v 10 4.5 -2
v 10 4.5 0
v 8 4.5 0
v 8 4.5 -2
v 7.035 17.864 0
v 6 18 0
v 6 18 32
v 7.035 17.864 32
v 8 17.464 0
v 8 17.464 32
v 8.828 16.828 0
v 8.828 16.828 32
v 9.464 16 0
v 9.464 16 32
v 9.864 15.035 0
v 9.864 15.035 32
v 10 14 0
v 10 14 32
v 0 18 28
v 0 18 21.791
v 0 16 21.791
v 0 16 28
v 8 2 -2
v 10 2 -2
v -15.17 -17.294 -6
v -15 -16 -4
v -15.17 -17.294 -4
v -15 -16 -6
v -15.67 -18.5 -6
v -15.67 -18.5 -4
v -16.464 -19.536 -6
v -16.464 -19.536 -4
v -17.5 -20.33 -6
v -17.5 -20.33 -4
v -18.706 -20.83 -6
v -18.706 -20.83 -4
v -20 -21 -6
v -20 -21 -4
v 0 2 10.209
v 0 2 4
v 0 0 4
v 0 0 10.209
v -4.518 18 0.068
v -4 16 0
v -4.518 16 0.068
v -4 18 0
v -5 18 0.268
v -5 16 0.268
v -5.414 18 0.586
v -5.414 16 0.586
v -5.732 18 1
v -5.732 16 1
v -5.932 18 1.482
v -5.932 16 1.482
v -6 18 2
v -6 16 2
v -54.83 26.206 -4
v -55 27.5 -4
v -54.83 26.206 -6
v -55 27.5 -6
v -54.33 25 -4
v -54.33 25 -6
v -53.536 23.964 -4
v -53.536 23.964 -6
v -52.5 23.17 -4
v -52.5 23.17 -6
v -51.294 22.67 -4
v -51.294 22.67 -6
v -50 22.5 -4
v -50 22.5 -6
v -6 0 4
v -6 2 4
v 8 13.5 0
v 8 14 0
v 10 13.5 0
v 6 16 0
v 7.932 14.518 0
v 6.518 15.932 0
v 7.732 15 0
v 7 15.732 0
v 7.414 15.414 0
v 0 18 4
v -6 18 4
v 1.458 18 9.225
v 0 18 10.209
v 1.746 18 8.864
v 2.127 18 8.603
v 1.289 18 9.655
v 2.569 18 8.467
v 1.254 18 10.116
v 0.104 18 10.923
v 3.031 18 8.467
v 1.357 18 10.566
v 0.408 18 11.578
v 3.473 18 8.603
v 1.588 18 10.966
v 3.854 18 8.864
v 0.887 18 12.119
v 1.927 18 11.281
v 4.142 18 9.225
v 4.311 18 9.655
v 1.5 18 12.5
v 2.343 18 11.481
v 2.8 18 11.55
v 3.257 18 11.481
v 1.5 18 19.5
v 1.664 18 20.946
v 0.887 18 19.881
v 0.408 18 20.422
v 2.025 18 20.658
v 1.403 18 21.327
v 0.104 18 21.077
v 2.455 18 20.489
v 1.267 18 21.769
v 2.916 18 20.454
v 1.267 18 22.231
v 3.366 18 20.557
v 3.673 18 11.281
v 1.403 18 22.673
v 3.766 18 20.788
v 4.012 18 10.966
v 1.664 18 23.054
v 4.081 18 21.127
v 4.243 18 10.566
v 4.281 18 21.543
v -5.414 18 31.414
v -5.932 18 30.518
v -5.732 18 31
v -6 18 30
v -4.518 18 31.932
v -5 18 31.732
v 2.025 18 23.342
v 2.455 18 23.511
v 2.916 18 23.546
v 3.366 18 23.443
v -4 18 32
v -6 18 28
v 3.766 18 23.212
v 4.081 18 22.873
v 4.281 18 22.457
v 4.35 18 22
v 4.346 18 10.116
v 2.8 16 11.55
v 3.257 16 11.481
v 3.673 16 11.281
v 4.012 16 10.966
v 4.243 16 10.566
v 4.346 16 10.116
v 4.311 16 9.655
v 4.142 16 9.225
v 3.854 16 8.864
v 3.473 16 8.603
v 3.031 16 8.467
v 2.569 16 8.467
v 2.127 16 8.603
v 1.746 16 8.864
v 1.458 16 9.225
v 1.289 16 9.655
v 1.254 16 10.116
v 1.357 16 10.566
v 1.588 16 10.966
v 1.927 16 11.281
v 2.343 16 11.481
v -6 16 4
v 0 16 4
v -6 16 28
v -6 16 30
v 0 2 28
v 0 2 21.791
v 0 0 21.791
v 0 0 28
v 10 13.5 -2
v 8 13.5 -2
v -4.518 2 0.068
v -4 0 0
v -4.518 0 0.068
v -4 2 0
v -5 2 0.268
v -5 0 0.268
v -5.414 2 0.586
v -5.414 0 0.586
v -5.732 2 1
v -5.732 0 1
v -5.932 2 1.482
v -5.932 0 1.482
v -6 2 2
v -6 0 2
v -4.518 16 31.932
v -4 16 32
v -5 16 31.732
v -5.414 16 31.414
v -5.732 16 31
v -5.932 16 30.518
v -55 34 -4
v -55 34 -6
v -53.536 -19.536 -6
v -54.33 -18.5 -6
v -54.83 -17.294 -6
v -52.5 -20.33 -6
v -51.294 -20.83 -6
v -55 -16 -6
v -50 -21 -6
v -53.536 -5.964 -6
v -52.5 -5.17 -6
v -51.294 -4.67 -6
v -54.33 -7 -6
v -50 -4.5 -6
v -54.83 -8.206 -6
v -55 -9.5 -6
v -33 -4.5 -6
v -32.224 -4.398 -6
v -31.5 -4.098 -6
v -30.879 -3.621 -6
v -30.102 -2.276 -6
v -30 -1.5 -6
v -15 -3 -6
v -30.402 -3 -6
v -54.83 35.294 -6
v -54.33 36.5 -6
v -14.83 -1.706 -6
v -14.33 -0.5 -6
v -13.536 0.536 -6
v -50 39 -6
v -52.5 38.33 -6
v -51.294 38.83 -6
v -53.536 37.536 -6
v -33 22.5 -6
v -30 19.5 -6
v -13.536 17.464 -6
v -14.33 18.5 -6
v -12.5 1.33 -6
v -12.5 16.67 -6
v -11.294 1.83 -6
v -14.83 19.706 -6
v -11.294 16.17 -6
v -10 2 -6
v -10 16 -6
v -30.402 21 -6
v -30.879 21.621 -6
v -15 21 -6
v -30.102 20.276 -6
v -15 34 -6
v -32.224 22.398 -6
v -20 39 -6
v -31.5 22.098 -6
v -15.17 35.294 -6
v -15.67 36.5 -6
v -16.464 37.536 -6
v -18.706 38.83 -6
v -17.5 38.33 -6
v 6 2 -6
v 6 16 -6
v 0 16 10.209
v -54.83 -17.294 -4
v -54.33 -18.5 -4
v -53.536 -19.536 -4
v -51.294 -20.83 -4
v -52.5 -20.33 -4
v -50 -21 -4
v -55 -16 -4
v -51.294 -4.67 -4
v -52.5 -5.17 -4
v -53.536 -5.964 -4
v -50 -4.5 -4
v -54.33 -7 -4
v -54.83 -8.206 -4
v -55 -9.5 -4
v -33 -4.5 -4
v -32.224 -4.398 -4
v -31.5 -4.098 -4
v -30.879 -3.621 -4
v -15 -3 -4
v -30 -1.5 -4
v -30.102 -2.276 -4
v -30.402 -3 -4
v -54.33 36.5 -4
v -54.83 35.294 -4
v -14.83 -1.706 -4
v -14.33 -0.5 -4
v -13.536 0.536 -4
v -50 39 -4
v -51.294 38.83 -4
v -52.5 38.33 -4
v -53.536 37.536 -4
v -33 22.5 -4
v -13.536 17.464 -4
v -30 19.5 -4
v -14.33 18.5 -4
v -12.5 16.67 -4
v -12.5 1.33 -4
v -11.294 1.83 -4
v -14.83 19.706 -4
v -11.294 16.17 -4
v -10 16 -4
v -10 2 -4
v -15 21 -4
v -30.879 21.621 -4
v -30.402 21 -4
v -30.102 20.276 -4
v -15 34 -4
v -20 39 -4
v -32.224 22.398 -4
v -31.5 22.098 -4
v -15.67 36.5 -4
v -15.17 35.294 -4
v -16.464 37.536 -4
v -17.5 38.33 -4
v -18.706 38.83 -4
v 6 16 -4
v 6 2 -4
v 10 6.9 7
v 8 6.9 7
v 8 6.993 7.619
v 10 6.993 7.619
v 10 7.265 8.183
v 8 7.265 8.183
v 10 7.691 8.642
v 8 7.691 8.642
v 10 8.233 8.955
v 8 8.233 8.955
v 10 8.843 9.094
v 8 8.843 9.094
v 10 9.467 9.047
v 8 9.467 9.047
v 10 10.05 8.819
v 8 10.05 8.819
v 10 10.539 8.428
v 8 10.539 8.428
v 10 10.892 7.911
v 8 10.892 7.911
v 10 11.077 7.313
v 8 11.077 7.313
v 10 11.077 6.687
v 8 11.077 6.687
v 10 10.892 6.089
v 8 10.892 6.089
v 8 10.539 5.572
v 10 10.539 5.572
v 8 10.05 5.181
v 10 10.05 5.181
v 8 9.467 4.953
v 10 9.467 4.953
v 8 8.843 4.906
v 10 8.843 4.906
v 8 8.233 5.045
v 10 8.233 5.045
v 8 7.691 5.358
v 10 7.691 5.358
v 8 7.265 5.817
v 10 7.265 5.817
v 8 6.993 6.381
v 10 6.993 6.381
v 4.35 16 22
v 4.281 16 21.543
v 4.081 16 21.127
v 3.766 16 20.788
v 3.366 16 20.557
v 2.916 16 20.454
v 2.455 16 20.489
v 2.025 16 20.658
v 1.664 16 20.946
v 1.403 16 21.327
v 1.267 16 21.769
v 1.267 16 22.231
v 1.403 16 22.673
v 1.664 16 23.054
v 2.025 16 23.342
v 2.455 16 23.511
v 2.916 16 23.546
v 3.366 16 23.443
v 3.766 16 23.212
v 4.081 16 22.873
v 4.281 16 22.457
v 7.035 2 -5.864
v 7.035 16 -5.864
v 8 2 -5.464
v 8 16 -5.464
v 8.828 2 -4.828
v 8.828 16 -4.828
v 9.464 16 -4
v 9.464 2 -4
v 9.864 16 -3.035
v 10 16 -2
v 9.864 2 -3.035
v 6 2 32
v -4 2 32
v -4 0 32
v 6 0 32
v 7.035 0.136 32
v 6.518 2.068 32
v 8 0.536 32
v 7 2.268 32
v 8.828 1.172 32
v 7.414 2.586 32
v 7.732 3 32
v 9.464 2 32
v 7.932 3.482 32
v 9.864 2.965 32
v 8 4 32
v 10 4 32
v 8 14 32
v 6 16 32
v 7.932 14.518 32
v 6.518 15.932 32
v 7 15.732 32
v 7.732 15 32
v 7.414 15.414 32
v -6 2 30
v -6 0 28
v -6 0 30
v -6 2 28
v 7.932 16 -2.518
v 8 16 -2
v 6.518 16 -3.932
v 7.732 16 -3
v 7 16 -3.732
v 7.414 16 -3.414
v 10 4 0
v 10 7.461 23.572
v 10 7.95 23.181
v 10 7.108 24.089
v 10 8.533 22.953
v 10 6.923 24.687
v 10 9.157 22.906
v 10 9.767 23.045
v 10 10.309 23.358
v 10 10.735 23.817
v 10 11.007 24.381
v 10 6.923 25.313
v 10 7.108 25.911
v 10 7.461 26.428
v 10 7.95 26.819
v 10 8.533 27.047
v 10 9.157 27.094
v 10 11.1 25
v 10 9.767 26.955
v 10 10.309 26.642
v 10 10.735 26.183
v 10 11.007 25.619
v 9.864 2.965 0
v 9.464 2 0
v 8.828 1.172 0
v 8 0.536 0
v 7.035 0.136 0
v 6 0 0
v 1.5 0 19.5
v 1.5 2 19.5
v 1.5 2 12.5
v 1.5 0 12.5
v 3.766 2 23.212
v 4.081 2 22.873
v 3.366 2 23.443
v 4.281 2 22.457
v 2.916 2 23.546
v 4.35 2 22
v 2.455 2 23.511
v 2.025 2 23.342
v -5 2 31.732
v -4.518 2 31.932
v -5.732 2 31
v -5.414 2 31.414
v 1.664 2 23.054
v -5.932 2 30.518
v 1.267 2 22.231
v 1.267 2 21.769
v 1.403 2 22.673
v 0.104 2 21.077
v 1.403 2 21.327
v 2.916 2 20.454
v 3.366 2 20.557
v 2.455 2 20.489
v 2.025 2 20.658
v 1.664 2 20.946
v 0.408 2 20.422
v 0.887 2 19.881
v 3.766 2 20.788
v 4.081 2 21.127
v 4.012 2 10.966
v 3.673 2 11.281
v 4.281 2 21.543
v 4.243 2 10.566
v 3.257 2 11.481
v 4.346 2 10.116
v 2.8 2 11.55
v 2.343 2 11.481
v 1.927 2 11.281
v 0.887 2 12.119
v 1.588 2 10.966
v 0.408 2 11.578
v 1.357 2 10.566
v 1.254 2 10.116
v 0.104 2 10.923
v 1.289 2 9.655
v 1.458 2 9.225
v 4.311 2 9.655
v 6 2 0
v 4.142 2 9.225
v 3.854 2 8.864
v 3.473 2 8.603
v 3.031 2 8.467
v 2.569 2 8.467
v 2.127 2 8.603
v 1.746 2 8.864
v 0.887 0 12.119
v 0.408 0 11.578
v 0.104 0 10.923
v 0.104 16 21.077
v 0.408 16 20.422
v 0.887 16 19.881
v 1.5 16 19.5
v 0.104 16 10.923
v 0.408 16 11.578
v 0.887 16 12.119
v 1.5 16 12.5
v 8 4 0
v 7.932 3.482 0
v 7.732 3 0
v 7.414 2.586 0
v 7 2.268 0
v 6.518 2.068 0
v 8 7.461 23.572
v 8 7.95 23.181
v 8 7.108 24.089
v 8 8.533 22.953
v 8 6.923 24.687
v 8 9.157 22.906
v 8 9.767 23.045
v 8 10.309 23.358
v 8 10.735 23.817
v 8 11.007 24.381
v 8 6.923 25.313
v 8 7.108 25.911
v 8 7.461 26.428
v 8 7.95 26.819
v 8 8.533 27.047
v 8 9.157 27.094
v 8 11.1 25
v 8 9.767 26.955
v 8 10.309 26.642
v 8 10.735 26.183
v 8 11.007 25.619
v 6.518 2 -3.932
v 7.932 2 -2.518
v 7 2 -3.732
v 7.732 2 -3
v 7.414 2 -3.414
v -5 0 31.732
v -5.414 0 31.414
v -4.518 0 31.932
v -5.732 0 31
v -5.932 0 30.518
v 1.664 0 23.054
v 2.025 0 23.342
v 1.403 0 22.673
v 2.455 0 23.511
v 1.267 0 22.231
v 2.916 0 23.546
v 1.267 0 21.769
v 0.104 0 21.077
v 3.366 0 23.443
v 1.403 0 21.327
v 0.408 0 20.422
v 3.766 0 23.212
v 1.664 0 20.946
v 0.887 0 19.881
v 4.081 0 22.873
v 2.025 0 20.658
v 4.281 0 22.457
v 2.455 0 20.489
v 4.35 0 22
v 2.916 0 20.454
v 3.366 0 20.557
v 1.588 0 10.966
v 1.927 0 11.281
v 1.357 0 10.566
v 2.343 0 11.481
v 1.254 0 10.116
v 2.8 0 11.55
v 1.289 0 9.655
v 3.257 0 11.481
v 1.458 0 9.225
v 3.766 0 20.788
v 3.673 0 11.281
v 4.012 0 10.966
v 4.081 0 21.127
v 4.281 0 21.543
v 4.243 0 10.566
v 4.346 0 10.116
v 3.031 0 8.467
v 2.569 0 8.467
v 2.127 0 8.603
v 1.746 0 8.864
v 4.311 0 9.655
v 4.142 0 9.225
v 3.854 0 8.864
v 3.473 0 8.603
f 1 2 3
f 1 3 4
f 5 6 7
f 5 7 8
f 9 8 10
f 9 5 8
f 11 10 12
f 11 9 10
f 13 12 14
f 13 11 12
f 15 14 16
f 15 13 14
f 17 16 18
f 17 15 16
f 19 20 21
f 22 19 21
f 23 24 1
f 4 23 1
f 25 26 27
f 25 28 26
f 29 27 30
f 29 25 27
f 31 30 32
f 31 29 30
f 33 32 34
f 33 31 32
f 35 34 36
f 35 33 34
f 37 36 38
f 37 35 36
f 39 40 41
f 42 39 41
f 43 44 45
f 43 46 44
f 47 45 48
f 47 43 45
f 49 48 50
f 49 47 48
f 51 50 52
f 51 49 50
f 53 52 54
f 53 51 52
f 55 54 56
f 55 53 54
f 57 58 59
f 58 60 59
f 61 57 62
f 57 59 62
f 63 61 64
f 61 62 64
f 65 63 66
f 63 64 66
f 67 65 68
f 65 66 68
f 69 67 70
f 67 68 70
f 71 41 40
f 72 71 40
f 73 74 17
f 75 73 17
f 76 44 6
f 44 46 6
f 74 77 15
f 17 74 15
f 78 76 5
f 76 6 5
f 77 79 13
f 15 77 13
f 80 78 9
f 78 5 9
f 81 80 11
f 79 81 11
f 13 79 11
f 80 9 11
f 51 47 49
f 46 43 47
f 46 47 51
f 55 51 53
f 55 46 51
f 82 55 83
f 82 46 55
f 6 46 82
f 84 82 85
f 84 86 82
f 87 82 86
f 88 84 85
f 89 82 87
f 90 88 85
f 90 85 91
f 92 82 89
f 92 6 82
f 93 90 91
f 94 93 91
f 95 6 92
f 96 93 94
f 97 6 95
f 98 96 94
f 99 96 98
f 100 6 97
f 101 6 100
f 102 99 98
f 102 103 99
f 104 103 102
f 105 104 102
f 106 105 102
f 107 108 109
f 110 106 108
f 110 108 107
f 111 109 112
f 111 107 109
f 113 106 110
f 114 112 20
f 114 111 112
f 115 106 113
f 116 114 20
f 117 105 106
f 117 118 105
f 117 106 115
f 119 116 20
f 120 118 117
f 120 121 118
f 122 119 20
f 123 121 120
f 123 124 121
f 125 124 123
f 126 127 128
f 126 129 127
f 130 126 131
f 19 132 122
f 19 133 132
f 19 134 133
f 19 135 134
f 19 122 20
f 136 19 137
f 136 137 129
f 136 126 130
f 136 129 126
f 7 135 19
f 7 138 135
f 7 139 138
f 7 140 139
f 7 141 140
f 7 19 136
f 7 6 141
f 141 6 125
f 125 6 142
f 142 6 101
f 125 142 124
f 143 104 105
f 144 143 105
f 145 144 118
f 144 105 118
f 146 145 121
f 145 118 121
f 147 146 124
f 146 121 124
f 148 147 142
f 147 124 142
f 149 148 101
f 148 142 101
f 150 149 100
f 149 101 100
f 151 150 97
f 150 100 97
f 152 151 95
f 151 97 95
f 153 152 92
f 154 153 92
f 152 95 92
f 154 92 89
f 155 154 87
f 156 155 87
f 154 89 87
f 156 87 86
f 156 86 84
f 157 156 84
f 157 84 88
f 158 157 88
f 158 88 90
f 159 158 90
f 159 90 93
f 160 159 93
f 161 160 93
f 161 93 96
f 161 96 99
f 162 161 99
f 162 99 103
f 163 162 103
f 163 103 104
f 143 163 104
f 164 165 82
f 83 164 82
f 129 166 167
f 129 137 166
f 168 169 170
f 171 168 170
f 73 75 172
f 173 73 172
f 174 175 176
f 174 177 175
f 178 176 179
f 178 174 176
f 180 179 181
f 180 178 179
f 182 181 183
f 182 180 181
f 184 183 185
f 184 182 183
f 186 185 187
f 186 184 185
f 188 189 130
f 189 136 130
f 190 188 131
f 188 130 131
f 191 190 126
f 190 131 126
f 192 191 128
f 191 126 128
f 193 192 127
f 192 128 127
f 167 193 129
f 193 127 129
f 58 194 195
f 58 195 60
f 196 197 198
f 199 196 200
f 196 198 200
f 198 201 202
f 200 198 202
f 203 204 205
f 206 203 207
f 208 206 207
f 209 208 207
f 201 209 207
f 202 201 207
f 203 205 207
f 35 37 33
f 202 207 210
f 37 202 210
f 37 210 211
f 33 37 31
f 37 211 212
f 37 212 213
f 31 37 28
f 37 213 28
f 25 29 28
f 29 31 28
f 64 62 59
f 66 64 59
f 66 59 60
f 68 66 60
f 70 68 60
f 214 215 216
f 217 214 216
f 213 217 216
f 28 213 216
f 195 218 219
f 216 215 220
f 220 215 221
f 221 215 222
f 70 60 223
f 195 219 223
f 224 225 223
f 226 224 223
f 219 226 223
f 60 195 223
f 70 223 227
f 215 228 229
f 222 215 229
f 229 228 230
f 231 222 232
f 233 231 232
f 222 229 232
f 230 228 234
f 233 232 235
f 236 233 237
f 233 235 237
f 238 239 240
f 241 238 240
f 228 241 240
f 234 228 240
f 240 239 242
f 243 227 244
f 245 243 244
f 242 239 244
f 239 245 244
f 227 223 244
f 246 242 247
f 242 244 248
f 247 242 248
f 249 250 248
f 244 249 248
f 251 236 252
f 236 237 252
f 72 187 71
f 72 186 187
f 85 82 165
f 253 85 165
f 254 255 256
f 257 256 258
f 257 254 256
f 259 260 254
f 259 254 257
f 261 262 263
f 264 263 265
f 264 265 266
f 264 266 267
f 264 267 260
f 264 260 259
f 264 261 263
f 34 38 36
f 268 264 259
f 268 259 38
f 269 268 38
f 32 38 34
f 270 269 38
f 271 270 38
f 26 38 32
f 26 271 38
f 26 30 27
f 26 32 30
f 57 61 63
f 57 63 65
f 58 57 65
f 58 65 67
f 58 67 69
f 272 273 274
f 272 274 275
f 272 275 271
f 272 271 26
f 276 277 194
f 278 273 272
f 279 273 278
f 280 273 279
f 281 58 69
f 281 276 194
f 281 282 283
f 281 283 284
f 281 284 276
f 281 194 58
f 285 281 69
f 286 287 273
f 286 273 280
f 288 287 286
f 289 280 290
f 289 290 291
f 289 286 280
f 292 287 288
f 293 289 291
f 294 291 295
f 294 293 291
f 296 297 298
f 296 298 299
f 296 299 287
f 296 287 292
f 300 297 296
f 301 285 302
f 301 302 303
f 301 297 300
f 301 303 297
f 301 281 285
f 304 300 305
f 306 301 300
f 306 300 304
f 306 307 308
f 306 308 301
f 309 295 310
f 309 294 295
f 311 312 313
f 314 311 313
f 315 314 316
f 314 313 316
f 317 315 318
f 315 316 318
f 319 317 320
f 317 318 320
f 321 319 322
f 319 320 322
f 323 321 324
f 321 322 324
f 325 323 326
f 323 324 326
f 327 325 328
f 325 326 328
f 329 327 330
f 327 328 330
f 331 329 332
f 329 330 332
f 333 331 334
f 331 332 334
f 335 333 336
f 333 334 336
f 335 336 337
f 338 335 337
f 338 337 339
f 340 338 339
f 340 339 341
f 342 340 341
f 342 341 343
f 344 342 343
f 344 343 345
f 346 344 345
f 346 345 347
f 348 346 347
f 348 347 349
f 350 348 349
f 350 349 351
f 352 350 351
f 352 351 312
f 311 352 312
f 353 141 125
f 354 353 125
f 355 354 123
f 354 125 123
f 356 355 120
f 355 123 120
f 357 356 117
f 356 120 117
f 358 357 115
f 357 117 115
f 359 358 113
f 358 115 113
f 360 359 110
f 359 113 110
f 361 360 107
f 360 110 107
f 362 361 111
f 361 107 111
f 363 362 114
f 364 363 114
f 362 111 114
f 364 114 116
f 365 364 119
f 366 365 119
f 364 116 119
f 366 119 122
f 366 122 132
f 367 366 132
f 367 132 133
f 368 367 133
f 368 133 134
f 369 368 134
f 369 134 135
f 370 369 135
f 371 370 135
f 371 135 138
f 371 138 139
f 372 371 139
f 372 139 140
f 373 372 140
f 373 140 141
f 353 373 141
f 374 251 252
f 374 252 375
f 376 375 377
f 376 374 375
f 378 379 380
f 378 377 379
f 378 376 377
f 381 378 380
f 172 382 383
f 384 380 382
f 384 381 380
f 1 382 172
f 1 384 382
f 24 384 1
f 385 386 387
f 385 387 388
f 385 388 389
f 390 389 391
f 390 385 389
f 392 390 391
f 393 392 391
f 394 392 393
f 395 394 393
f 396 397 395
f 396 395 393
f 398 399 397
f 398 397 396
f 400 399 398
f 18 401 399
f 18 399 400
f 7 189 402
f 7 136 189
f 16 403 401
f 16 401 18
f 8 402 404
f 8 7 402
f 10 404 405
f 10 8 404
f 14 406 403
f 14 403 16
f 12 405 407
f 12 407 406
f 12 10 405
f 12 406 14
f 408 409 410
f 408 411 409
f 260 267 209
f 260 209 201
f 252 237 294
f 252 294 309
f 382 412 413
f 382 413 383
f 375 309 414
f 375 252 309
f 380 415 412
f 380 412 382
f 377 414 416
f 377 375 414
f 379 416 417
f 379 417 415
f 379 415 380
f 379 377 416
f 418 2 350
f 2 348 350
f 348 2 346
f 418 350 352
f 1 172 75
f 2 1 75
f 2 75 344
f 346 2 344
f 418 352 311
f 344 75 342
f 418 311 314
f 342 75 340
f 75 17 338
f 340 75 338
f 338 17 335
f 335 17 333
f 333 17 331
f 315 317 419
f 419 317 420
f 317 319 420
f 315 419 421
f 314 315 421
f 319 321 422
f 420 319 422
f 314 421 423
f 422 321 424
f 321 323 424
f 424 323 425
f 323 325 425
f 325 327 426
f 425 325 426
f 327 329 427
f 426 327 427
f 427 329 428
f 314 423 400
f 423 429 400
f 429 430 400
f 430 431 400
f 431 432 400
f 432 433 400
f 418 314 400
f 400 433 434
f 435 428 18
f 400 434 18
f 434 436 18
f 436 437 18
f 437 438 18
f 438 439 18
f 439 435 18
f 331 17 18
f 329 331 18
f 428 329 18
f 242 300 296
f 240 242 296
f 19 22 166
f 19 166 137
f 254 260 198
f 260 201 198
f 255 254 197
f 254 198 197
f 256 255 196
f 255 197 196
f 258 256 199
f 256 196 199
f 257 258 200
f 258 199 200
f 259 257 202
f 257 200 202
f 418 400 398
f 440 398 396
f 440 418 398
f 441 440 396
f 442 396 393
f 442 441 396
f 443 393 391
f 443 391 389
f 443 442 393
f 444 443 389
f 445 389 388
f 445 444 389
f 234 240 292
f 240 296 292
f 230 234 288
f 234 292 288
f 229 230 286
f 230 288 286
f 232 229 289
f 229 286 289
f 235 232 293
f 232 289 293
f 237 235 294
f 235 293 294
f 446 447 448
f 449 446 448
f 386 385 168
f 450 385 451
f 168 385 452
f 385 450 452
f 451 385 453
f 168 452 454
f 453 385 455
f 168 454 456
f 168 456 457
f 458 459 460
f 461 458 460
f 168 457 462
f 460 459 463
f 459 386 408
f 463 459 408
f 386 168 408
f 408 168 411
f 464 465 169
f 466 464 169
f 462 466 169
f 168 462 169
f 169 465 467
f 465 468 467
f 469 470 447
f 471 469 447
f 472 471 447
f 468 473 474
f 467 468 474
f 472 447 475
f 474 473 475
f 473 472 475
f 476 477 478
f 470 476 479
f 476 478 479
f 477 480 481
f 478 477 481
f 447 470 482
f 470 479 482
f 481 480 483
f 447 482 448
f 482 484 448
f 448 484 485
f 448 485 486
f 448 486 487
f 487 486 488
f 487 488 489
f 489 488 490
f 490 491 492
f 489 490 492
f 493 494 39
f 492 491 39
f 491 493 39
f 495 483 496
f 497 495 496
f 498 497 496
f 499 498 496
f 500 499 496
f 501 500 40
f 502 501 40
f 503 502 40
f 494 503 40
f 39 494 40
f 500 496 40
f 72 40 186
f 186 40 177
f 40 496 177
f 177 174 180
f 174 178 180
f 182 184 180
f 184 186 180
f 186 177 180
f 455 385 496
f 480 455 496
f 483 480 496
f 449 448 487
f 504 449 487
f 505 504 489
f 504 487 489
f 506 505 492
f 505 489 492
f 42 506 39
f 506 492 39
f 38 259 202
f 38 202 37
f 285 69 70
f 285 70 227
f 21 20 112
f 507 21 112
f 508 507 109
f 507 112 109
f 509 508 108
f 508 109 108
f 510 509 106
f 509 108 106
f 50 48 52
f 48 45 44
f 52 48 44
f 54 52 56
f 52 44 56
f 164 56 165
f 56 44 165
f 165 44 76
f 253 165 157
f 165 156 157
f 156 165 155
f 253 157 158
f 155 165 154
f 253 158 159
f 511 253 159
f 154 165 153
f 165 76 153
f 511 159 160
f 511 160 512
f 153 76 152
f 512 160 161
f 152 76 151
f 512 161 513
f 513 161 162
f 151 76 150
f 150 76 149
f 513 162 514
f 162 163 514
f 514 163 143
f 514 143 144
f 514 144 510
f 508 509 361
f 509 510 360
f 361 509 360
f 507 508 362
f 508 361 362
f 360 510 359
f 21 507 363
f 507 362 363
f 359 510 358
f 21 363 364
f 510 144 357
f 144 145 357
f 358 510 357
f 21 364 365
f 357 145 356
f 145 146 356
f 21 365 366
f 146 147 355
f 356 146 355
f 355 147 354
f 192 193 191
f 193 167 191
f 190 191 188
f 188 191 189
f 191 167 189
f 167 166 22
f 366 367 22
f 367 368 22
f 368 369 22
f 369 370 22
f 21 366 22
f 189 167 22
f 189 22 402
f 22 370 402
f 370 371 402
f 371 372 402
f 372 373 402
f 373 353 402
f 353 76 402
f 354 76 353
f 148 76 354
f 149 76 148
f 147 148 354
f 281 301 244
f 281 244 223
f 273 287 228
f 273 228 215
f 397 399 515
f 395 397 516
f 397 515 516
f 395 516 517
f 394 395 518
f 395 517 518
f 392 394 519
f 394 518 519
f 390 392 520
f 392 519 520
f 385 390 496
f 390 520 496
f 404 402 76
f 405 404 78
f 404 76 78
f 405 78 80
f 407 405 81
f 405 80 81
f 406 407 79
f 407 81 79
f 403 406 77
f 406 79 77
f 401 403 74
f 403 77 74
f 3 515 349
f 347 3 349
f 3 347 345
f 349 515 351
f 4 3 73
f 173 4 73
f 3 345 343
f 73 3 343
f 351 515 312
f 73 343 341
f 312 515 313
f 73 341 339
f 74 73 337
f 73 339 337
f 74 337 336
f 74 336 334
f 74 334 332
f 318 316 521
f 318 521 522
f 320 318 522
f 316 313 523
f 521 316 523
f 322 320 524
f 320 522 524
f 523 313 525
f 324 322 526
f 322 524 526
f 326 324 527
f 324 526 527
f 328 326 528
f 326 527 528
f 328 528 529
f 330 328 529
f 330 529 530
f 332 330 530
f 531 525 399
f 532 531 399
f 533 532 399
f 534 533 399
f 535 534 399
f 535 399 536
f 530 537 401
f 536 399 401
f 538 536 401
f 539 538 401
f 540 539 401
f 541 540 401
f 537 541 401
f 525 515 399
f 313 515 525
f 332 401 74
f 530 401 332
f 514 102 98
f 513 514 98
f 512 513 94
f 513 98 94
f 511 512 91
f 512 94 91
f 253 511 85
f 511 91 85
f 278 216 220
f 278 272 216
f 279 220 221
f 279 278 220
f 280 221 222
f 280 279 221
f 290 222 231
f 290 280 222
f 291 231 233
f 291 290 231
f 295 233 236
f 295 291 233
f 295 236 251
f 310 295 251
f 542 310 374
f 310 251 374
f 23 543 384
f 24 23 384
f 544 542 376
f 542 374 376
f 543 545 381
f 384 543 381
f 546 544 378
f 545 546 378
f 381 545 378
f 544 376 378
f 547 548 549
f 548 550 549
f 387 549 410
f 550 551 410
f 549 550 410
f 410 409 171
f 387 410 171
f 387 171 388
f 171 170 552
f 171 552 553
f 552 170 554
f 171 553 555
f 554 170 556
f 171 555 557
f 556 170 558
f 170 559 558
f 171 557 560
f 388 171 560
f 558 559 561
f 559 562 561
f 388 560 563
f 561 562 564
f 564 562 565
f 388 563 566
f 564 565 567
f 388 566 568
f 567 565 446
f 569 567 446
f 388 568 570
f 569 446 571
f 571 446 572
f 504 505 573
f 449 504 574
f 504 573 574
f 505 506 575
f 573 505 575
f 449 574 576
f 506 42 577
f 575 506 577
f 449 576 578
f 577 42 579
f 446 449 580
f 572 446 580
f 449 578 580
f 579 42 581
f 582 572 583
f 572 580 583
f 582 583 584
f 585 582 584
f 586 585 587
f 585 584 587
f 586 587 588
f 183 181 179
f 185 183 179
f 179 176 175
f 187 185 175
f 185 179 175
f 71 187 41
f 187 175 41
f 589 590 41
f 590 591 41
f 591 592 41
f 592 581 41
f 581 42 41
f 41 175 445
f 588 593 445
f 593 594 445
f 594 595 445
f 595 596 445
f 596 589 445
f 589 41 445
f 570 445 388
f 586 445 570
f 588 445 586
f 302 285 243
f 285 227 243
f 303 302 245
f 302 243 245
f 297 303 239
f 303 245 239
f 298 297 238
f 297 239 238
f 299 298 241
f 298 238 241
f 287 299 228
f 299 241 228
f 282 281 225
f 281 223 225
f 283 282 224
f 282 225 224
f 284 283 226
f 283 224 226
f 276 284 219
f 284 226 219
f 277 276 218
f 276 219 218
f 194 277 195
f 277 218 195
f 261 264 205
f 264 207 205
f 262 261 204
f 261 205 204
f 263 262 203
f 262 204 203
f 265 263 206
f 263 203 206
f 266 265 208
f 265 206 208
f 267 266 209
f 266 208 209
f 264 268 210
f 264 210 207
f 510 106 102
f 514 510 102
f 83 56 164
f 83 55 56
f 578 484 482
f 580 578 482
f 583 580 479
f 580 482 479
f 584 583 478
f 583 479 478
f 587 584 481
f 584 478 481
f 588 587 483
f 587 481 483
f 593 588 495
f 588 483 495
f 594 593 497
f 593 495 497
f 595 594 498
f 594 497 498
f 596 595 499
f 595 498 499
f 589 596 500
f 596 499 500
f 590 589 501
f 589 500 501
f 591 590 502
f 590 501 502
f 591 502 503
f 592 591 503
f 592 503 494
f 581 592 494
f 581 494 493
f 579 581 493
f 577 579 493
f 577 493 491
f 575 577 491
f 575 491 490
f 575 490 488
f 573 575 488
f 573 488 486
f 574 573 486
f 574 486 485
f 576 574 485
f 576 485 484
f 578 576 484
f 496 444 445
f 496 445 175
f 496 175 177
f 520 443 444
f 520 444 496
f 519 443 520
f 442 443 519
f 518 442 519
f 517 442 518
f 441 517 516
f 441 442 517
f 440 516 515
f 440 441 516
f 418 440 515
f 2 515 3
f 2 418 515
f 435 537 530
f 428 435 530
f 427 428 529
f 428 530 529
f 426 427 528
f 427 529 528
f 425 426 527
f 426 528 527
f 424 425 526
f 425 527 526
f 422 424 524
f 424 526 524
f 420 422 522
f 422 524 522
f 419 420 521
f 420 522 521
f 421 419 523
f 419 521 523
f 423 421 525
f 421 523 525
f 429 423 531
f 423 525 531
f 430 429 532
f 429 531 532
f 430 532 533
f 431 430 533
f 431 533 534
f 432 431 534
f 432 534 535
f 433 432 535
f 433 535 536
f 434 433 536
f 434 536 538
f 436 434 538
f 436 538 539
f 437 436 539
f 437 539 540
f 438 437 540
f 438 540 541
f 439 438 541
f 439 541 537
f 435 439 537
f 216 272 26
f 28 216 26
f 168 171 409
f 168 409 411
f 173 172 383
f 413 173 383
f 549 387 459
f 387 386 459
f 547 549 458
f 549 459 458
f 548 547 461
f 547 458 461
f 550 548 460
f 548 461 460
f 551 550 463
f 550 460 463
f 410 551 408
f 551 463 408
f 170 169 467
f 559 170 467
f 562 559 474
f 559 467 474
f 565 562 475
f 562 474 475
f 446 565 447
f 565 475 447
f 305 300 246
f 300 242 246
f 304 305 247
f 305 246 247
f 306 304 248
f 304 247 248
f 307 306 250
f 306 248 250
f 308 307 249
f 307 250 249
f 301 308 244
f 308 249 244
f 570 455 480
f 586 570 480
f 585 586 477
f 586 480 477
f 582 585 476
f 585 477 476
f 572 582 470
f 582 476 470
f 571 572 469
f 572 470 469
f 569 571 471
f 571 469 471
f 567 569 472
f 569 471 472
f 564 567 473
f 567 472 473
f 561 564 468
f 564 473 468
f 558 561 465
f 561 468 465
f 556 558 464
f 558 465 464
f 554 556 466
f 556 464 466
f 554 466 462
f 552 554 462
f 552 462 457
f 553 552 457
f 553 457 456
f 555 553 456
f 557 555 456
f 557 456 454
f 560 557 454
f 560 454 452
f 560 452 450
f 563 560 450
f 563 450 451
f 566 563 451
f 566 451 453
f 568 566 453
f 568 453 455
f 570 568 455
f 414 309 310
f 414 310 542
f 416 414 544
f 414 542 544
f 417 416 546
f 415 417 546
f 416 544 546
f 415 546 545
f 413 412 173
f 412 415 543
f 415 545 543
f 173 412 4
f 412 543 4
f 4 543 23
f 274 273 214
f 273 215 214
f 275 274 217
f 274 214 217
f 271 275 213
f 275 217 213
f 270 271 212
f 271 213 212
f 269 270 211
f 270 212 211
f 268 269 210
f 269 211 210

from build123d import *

# Parameters (mm, degrees)
BOSS_EXTRU_1_DEPTH        = 32
ESQUISSE2_R               = 1.55
ENL_V_MAT_EXTRU_1_DEPTH   = 39.052595181
ESQUISSE3_W               = 1.5
ESQUISSE3_H               = 7
ENL_V_MAT_EXTRU_2_DEPTH   = 39.052595181
ESQUISSE4_W               = 4
ESQUISSE4_H               = 2
BOSS_EXTRU_2_DEPTH        = 6
CONG_1_R                  = 2.5
CONG_2_R                  = 2
ESQUISSE13_R              = 2.1
ENL_V_MAT_EXTRU_3_DEPTH   = 40.293765409
ESQUISSE14_W              = 2
ESQUISSE14_H              = 14
BOSS_EXTRU_3_DEPTH        = 4
BOSS_EXTRU_4_START        = -14
ESQUISSE15_W              = 25
ESQUISSE15_H              = 2
BOSS_EXTRU_4_DEPTH        = 14
BOSS_EXTRU_5_START        = -2
BOSS_EXTRU_5_DEPTH        = 2
CONG_5_R                  = 5
CONG_6_R                  = 3
ESQUISSE26_W              = 2
ESQUISSE26_H              = 2.5
ENL_V_MAT_EXTRU_5_DEPTH   = 83.280009723
CONVERTIR_VOLUME3_DEPTH   = 32
CONVERTIR_VOLUME3_START   = 2
CONVERTIR_VOLUME3_2_DEPTH = 14
CONVERTIR_VOLUME3_3_DEPTH = 32
CONVERTIR_VOLUME3_START_2 = -6
CONVERTIR_VOLUME3_4_DEPTH = 2
CONVERTIR_VOLUME3_5_DEPTH = 14


# Read off the part's stored shape, not the designer's step: Convertir-Volume3
with BuildPart() as part:
    # Esquisse1 → Boss.-Extru.1 (new body)
    with BuildSketch(Plane.XY):
        Polygon((0, 0), (10, 0), (10, 18), (0, 18), (0, 16), (8, 16), (8, 2), (0, 2), align=None)
    extrude(amount=BOSS_EXTRU_1_DEPTH)

    # Esquisse2 → Enlèv. mat.-Extru.1 (cut, through all)
    with BuildSketch(Plane(origin=(0, 18, 0), x_dir=(1, 0, 0), z_dir=(0, 1, 0))):
        with Locations(Location((2.8, -10, 0), (0, 0, 270))):
            Circle(ESQUISSE2_R)
        with Locations((2.8, -22)):
            Circle(ESQUISSE2_R)
    extrude(amount=-ENL_V_MAT_EXTRU_1_DEPTH, mode=Mode.SUBTRACT)

    # Esquisse3 → Enlèv. mat.-Extru.2 (cut, through all)
    with BuildSketch(Plane(origin=(0, 18, 0), x_dir=(1, 0, 0), z_dir=(0, 1, 0))):
        with Locations((0.75, -16)):
            Rectangle(ESQUISSE3_W, ESQUISSE3_H)
    extrude(amount=-ENL_V_MAT_EXTRU_2_DEPTH, mode=Mode.SUBTRACT)

    # Esquisse4 → Boss.-Extru.2 (add)
    with BuildSketch(Plane.ZY):
        with Locations((2, 17)):
            Rectangle(ESQUISSE4_W, ESQUISSE4_H)
        with Locations((2, 1)):
            Rectangle(ESQUISSE4_W, ESQUISSE4_H)
        with Locations((30, 1)):
            Rectangle(ESQUISSE4_W, ESQUISSE4_H)
        with Locations((30, 17)):
            Rectangle(ESQUISSE4_W, ESQUISSE4_H)
    extrude(amount=BOSS_EXTRU_2_DEPTH)

    # Congé1
    # the kernel refuses this fillet: 2.5 mm, written as the material it takes off along each edge
    with BuildSketch(Plane(origin=(0, 7.728219619, 19.5), x_dir=(0, 0, 1), z_dir=(0, -1, 0)), Plane(origin=(0, 23.728219619, 19.5), x_dir=(0, 0, 1), z_dir=(0, -1, 0))) as cong_1_piece_1:
        with BuildLine():
            CenterArc((2.291287847, -2.5), CONG_1_R, 90, 66.421821522)
            Line((0, -1.5), (-0.045825757, -1.48))
            ThreePointArc((-0.045825757, -1.48), (-0.05, -0.75), (-0.05, 0))
            Line((-0.05, 0), (0, 0.05))
            Line((0, 0.05), (2.291287847, 0.05))
            Line((2.291287847, 0.05), (2.291287847, 0))
        make_face()
    extrude(amount=13.456439237, mode=Mode.SUBTRACT)
    with BuildSketch(Plane(origin=(0, 7.728219619, 12.5), x_dir=(1, 0, 0), z_dir=(0, -1, 0)), Plane(origin=(0, 23.728219619, 12.5), x_dir=(1, 0, 0), z_dir=(0, -1, 0))) as cong_1_piece_2:
        with BuildLine():
            CenterArc((2.5, -2.291287847), CONG_1_R, 113.578178478, 66.421821522)
            Line((0, -2.291287847), (-0.05, -2.291287847))
            Line((-0.05, -2.291287847), (-0.05, 0))
            Line((-0.05, 0), (0, 0.05))
            ThreePointArc((0, 0.05), (0.75, 0.05), (1.48, 0.045825757))
            Line((1.48, 0.045825757), (1.5, 0))
        make_face()
    extrude(amount=13.456439237, mode=Mode.SUBTRACT)

    # Congé2
    cong_2_edges = [part.edges().sort_by_distance(p)[0] for p in [
        (-6, 17, 32),
        (-6, 17, 0),
        (-6, 1, 0),
        (-6, 1, 32),
    ]]
    fillet(cong_2_edges, radius=CONG_2_R)

    # Esquisse13 → Enlèv. mat.-Extru.3 (cut, through all)
    with BuildSketch(Plane.ZY.offset(-8)):
        with Locations(Location((7, 9, 0), (0, 0, 270))):
            Circle(ESQUISSE13_R)
        with Locations(Location((25, 9, 0), (0, 0, 90))):
            Circle(ESQUISSE13_R)
    extrude(amount=-ENL_V_MAT_EXTRU_3_DEPTH, mode=Mode.SUBTRACT)

    # Esquisse14 → Boss.-Extru.3 (add)
    with BuildSketch(Plane(origin=(0, 0, 0), x_dir=(-1, 0, 0), z_dir=(0, 0, -1))):
        with Locations((-9, 9)):
            Rectangle(ESQUISSE14_W, ESQUISSE14_H)
    extrude(amount=BOSS_EXTRU_3_DEPTH)

    # Esquisse15 → Boss.-Extru.4 (add)
    with BuildSketch(Plane.XZ.offset(-2).offset(BOSS_EXTRU_4_START)):
        with Locations((-2.5, -5)):
            Rectangle(ESQUISSE15_W, ESQUISSE15_H)
    extrude(amount=BOSS_EXTRU_4_DEPTH)

    # Esquisse16 → Boss.-Extru.5 (add)
    with BuildSketch(Plane(origin=(0, 0, -6), x_dir=(-1, 0, 0), z_dir=(0, 0, -1)).offset(BOSS_EXTRU_5_START)):
        Polygon((15, 16), (15, 39), (55, 39), (55, 22.5), (30, 22.5), (30, -4.5), (55, -4.5), (55, -21), (15, -21), (15, 2), align=None)
    extrude(amount=BOSS_EXTRU_5_DEPTH)

    # Congé5
    cong_5_edges = [part.edges().sort_by_distance(p)[0] for p in [
        (-15, 16, -5),
        (-15, 2, -5),
        (-15, -21, -5),
        (-15, 39, -5),
        (-55, 39, -5),
        (-55, 22.5, -5),
        (-55, -4.5, -5),
        (-55, -21, -5),
    ]]
    fillet(cong_5_edges, radius=CONG_5_R)

    # Congé6
    cong_6_edges = [part.edges().sort_by_distance(p)[0] for p in [
        (-30, 22.5, -5),
        (-30, -4.5, -5),
    ]]
    fillet(cong_6_edges, radius=CONG_6_R)

    # Esquisse26 → Enlèv. mat.-Extru.5 (cut, through all)
    with BuildSketch(Plane(origin=(10, 0, 0), x_dir=(0, 0, -1), z_dir=(1, 0, 0))):
        with Locations((1, 3.25)):
            Rectangle(ESQUISSE26_W, ESQUISSE26_H)
        with Locations((1, 14.75)):
            Rectangle(ESQUISSE26_W, ESQUISSE26_H)
    extrude(amount=-ENL_V_MAT_EXTRU_5_DEPTH, mode=Mode.SUBTRACT)

    # Convertir-Volume3 outline → Convertir-Volume3 (add)
    with BuildSketch(Plane.XY):
        with BuildLine():
            ThreePointArc((6, 16), (7.414213562, 15.414213562), (8, 14))
            Line((8, 14), (8, 16))
            Line((8, 16), (6, 16))
        make_face()
        with BuildLine():
            Line((8, 2), (8, 4))
            ThreePointArc((8, 4), (7.414213562, 2.585786438), (6, 2))
            Line((6, 2), (8, 2))
        make_face()
    extrude(amount=CONVERTIR_VOLUME3_DEPTH)

    # Convertir-Volume3 2 outline → Convertir-Volume3 2 (add)
    with BuildSketch(Plane(origin=(0, 0, 0), x_dir=(1, 0, 0), z_dir=(0, 1, 0)).offset(CONVERTIR_VOLUME3_START)):
        with BuildLine():
            ThreePointArc((6, 4), (7.414213562, 3.414213562), (8, 2))
            Line((8, 2), (8, 4))
            Line((8, 4), (6, 4))
        make_face()
    extrude(amount=CONVERTIR_VOLUME3_2_DEPTH)

    # Convertir-Volume3 3 outline → Convertir-Volume3 3 (cut)
    with BuildSketch(Plane.XY):
        with BuildLine():
            Line((10, 14), (10, 18))
            Line((10, 18), (6, 18))
            ThreePointArc((6, 18), (8.828427125, 16.828427125), (10, 14))
        make_face()
        with BuildLine():
            Line((10, 0), (10, 4))
            ThreePointArc((10, 4), (8.828427125, 1.171572875), (6, 0))
            Line((6, 0), (10, 0))
        make_face()
    extrude(amount=CONVERTIR_VOLUME3_3_DEPTH, mode=Mode.SUBTRACT)

    # Convertir-Volume3 4 outline → Convertir-Volume3 4 (cut)
    with BuildSketch(Plane.XY.offset(CONVERTIR_VOLUME3_START_2)):
        with BuildLine():
            Line((10, 16), (9.464101616, 16))
            ThreePointArc((9.464101616, 16), (9.863703305, 15.03527618), (10, 14))
            Line((10, 14), (10, 16))
        make_face()
        with BuildLine():
            ThreePointArc((10, 4), (9.863703305, 2.96472382), (9.464101616, 2))
            Line((9.464101616, 2), (10, 2))
            Line((10, 2), (10, 4))
        make_face()
    extrude(amount=CONVERTIR_VOLUME3_4_DEPTH, mode=Mode.SUBTRACT)

    # Convertir-Volume3 5 outline → Convertir-Volume3 5 (cut)
    with BuildSketch(Plane(origin=(0, 0, 0), x_dir=(1, 0, 0), z_dir=(0, 1, 0)).offset(CONVERTIR_VOLUME3_START)):
        with BuildLine():
            ThreePointArc((6, 6), (8.828427125, 4.828427125), (10, 2))
            Line((10, 2), (10, 6))
            Line((10, 6), (6, 6))
        make_face()
    extrude(amount=CONVERTIR_VOLUME3_5_DEPTH, mode=Mode.SUBTRACT)


solid = part.part
